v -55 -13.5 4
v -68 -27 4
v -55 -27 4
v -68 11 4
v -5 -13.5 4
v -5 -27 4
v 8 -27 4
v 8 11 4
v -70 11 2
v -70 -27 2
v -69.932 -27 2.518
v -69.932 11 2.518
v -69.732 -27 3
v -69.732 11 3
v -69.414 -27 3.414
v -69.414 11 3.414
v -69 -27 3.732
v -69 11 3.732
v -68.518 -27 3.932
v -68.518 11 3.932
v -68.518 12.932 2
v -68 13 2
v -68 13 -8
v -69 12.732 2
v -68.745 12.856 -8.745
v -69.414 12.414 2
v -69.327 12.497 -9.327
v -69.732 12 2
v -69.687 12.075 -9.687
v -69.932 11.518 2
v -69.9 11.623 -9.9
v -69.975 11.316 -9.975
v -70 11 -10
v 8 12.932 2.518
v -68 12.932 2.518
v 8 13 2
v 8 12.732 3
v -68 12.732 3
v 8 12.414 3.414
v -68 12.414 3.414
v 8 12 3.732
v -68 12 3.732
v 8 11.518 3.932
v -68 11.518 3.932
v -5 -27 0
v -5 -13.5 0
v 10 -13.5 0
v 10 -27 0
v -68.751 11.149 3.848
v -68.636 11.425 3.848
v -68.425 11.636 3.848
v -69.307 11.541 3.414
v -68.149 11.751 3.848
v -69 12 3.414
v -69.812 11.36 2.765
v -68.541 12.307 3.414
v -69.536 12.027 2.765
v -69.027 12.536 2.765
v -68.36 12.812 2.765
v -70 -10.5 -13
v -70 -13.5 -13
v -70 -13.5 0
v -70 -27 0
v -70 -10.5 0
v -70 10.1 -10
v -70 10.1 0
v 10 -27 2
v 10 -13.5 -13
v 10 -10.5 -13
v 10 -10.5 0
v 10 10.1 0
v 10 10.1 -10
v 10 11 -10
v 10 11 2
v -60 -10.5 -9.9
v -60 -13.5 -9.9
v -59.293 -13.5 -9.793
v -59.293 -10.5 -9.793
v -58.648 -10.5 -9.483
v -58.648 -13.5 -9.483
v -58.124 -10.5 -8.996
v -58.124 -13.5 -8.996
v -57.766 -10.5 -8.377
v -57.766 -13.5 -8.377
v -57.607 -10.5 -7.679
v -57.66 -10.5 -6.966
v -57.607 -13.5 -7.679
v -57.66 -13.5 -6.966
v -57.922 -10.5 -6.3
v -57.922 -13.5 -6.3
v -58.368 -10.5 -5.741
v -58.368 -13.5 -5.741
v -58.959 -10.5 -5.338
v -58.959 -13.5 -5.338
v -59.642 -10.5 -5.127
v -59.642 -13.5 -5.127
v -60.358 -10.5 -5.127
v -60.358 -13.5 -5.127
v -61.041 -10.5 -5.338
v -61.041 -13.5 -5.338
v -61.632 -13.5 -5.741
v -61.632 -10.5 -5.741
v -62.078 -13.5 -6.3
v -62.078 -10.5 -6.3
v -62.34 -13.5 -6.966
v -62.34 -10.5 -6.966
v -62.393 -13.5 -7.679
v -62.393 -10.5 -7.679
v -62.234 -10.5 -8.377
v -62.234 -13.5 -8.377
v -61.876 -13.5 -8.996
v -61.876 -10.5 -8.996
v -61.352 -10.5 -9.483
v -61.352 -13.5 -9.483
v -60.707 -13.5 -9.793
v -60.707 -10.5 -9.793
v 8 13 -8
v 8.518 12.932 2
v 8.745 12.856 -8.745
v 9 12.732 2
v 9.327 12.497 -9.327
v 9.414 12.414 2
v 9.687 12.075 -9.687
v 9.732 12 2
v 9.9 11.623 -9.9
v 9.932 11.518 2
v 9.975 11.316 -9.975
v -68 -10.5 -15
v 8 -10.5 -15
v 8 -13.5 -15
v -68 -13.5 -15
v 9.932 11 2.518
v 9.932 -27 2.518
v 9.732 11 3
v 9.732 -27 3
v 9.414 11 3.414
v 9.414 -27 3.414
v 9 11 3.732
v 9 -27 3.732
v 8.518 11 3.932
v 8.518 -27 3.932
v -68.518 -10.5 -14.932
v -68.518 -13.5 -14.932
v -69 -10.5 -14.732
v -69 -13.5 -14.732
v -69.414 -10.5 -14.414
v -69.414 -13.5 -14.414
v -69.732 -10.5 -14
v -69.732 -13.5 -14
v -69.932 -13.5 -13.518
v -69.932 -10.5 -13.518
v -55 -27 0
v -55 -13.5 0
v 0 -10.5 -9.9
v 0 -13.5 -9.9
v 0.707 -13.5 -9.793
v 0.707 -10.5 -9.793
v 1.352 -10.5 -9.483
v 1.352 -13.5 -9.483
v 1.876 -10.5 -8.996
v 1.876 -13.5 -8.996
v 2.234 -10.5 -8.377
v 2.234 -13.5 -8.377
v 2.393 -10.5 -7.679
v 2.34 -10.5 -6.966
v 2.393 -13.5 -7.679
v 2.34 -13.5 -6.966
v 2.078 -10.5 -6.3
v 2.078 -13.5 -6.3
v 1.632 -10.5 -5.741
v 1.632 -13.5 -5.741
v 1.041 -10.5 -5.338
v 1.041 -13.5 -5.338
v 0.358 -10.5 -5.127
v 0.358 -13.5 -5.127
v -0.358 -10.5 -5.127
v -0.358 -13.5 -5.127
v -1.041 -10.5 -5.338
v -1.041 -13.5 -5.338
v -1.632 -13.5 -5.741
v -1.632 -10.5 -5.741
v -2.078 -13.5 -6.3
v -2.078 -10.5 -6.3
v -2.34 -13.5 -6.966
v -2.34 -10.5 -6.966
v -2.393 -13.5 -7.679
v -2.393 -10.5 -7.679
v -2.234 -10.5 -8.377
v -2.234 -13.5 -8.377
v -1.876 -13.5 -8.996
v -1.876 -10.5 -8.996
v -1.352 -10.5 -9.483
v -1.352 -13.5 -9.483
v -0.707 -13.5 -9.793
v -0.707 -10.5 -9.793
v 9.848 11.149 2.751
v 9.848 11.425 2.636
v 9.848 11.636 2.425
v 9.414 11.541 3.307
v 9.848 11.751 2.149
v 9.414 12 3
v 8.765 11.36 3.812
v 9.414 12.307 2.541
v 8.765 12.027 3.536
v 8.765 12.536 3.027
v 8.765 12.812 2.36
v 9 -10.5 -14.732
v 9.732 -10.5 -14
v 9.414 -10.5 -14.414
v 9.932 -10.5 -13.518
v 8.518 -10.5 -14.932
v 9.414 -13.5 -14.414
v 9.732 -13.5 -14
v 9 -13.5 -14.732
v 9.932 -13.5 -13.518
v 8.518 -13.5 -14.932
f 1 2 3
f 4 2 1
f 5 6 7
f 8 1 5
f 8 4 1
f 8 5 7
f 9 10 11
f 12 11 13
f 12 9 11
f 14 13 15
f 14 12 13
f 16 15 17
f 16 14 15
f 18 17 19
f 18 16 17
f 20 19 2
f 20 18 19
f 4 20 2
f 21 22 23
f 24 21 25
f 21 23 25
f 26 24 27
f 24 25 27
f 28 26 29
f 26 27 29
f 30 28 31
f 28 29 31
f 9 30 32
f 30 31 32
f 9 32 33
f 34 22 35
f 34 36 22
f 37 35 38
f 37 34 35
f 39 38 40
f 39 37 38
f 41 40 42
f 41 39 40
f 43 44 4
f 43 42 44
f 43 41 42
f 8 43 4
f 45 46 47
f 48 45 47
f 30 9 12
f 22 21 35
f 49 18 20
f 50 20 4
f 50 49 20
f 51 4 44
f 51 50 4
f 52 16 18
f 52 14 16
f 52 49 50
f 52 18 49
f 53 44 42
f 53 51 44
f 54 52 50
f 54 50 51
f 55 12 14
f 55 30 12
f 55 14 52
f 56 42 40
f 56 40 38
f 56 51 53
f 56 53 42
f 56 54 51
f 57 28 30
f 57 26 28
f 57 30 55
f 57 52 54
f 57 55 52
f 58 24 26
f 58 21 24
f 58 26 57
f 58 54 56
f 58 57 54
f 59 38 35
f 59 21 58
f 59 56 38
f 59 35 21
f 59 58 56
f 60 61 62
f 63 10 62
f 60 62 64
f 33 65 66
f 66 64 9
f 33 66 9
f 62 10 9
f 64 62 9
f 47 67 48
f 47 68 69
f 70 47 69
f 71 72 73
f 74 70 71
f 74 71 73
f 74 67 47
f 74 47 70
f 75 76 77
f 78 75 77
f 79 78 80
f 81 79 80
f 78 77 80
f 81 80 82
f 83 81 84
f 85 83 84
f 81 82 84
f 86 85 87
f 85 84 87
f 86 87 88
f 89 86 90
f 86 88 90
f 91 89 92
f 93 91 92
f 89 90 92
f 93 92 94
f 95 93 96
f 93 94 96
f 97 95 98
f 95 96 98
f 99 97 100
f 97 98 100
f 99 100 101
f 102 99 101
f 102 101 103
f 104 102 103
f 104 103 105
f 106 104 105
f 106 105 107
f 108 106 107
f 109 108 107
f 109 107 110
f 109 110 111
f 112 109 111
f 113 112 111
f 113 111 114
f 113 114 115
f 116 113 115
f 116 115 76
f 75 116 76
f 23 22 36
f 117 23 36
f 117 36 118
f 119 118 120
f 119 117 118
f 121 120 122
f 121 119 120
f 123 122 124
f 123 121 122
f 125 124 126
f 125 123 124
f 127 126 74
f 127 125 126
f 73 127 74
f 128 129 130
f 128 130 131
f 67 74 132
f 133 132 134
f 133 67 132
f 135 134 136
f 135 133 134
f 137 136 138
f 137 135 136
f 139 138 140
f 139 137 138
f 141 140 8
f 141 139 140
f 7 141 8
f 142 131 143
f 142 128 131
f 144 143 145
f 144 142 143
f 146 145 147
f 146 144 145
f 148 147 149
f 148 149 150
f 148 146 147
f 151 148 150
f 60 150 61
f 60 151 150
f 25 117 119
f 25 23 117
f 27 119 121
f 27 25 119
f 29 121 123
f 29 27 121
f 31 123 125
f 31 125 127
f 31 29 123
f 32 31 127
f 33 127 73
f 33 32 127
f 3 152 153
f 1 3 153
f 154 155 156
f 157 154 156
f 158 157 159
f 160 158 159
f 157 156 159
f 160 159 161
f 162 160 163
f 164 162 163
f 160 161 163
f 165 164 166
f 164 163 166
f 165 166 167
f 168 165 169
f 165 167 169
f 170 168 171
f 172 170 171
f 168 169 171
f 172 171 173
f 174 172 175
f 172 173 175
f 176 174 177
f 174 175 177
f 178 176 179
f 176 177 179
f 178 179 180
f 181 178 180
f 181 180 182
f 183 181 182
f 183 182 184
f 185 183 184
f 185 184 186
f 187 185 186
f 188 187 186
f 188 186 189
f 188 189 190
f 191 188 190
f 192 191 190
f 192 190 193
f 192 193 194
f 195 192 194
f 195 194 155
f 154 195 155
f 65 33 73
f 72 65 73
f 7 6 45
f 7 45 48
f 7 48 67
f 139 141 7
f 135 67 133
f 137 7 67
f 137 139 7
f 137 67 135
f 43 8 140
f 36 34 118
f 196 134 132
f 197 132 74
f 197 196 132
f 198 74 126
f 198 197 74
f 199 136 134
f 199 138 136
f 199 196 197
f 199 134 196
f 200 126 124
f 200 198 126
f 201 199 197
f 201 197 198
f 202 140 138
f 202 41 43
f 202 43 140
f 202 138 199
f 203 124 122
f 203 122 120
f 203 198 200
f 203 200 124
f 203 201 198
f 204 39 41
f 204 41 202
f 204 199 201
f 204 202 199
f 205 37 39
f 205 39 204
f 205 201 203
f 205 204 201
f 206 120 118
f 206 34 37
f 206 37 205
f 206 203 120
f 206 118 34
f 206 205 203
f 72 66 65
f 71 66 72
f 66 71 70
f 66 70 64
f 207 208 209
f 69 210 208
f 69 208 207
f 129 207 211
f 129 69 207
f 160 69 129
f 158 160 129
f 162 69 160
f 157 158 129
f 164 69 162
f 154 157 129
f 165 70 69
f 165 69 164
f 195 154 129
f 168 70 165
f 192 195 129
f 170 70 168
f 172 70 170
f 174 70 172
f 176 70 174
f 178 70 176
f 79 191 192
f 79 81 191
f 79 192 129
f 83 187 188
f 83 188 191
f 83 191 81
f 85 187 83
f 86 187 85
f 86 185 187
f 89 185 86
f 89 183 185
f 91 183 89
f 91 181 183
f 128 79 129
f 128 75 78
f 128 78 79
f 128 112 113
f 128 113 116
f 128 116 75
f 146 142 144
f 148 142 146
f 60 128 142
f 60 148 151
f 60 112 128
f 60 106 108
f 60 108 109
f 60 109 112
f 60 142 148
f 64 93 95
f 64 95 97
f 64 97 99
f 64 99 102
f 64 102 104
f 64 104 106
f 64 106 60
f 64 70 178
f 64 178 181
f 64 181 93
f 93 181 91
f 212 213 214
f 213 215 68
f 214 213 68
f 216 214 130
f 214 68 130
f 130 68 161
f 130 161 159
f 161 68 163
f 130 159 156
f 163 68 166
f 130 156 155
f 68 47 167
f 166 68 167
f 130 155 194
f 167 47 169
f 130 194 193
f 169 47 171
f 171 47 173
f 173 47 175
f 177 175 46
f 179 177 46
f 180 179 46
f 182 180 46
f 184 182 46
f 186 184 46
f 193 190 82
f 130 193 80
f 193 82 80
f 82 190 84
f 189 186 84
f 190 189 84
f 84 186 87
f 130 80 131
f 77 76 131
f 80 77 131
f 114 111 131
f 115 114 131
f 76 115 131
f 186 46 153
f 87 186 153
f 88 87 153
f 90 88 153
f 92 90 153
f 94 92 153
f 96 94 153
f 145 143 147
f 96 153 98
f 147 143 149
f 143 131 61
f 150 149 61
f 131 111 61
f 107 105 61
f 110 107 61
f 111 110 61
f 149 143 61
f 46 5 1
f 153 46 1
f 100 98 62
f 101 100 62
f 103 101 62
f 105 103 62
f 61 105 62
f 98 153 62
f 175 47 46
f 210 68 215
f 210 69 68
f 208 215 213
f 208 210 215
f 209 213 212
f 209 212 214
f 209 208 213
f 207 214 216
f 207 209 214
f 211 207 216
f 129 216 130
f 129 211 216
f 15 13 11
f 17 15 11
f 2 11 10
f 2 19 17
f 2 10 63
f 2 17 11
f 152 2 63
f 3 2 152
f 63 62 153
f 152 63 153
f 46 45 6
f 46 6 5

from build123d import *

# Parameters (mm, degrees)
SKETCH_1_R              = 1.7
SKETCH_1_R_2            = 11.5
EXTRUDE_1_DEPTH         = 4
SKETCH_1_4_W            = 80
SKETCH_1_4_H            = 3
EXTRUDE_2_DEPTH         = 10
EXTRUDE_3_DEPTH         = 10
RIB_2_REACH             = 110.093
SKETCH_4_WALL_W         = 240.545785644
SKETCH_4_WALL_H         = 5
SKETCH_5_W              = 2
SKETCH_5_H              = 0.1
SKETCH_5_W_2            = 4.2
SKETCH_5_H_2            = 2
CUT_EXTRUDE_2_DEPTH     = 10
CHAMFER_1_SIZE          = 0.25
SKETCH_6_W              = 91
SKETCH_6_H              = 17
EXTRUDE_4_DEPTH         = 4
SKETCH_7_W              = 80
SKETCH_7_H              = 3.5
EXTRUDE_5_DEPTH         = 15
SKETCH_8_W              = 50
SKETCH_8_H              = 13.5
CUT_EXTRUDE_3_DEPTH     = 102.533245787
CUT_EXTRUDE_4_DEPTH     = 15
CUT_EXTRUDE_5_REACH     = 113.513
SKETCH_10_R             = 2.4
FILLET_1_R              = 10
SKETCH_11_W             = 92.157342817
SKETCH_11_H             = 59.862511732
CUT_EXTRUDE_6_DEPTH     = 103.200782776
CUT_EXTRUDE_START       = -15
CUT_EXTRUDE_7_OUTLINE_W = 80
CUT_EXTRUDE_7_OUTLINE_H = 0.5
CUT_EXTRUDE_7_DEPTH     = 15
FILLET_2_R              = 2


# Read off the part's stored shape, not the designer's step: 切除-拉伸7
with BuildPart() as part:
    # 草图1 → 凸台-拉伸1 (new body)
    with BuildSketch(Plane.XY):
        with BuildLine():
            Line((-70, 13), (-70, -10))
            Line((-70, -10), (21, -10))
            Line((21, -10), (21, 44.755002002))
            ThreePointArc((21, 44.755002002), (20.506939094, 46.920065511), (19.125, 48.658125751))
            ThreePointArc((19.125, 48.658125751), (18, 51), (19.125, 53.341874249))
            ThreePointArc((19.125, 53.341874249), (20.506939094, 55.079934489), (21, 57.244997998))
            Line((21, 57.244997998), (21, 67))
            ThreePointArc((21, 67), (19.535533906, 70.535533906), (16, 72))
            Line((16, 72), (6.244997998, 72))
            ThreePointArc((6.244997998, 72), (4.079934489, 71.506939094), (2.341874249, 70.125))
            ThreePointArc((2.341874249, 70.125), (0, 69), (-2.341874249, 70.125))
            ThreePointArc((-2.341874249, 70.125), (-4.079934489, 71.506939094), (-6.244997998, 72))
            Line((-6.244997998, 72), (-16, 72))
            ThreePointArc((-16, 72), (-19.535533906, 70.535533906), (-21, 67))
            Line((-21, 67), (-21, 57.244997998))
            ThreePointArc((-21, 57.244997998), (-20.506939094, 55.079934489), (-19.125, 53.341874249))
            ThreePointArc((-19.125, 53.341874249), (-18, 51), (-19.125, 48.658125751))
            ThreePointArc((-19.125, 48.658125751), (-20.506939094, 46.920065511), (-21, 44.755002002))
            Line((-21, 44.755002002), (-21, 13))
            Line((-21, 13), (-70, 13))
        make_face()
        with Locations((-15.5, 35.5)):
            Circle(SKETCH_1_R, mode=Mode.SUBTRACT)
        with Locations((-15.5, 66.5)):
            Circle(SKETCH_1_R, mode=Mode.SUBTRACT)
        with Locations((15.5, 35.5)):
            Circle(SKETCH_1_R, mode=Mode.SUBTRACT)
        with Locations((0, 51)):
            Circle(SKETCH_1_R_2, mode=Mode.SUBTRACT)
        with Locations((15.5, 66.5)):
            Circle(SKETCH_1_R, mode=Mode.SUBTRACT)
    extrude(amount=EXTRUDE_1_DEPTH)

    # 草图1<4> → 凸台-拉伸2 (add)
    with BuildSketch(Plane.XY):
        with Locations((-30, 11.5)):
            Rectangle(SKETCH_1_4_W, SKETCH_1_4_H)
    extrude(amount=-EXTRUDE_2_DEPTH)

    # 草图1<5> → 凸台-拉伸3 (add)
    with BuildSketch(Plane.XY):
        Polygon((3.05, 8), (3.05, 10), (-3.05, 10), (-3.05, 8), (-5.05, 8), (-5.05, 6.5), (-4.55, 6), (4.55, 6), (5.05, 6.5), (5.05, 8), align=None)
        Polygon((-16.95, 10), (-23.05, 10), (-23.05, 8), (-25.05, 8), (-25.05, 6.5), (-24.55, 6), (-15.45, 6), (-14.95, 6.5), (-14.95, 8), (-16.95, 8), align=None)
        Polygon((-36.95, 10), (-43.05, 10), (-43.05, 8), (-45.05, 8), (-45.05, 6.5), (-44.55, 6), (-35.45, 6), (-34.95, 6.5), (-34.95, 8), (-36.95, 8), align=None)
        Polygon((-26, 4.55), (-26, -4.55), (-26.5, -5.05), (-28, -5.05), (-28, -3.05), (-32, -3.05), (-32, -5.05), (-33.5, -5.05), (-34, -4.55), (-34, 4.55), (-33.5, 5.05), (-32, 5.05), (-32, 3.05), (-28, 3.05), (-28, 5.05), (-26.5, 5.05), align=None)
        Polygon((-23.05, -8), (-23.05, -10), (-16.95, -10), (-16.95, -8), (-14.95, -8), (-14.95, -6.5), (-15.45, -6), (-24.55, -6), (-25.05, -6.5), (-25.05, -8), align=None)
        Polygon((-43.05, -8), (-43.05, -10), (-36.95, -10), (-36.95, -8), (-34.95, -8), (-34.95, -6.5), (-35.45, -6), (-44.55, -6), (-45.05, -6.5), (-45.05, -8), align=None)
    extrude(amount=-EXTRUDE_3_DEPTH)

    # 草图4 wall → 筋2 (add, up to next)
    with BuildSketch(Plane(origin=(10, 23, -5), x_dir=(0, 0.894427191, 0.4472135955), z_dir=(0, -0.4472135955, 0.894427191)), mode=Mode.PRIVATE) as rib_2_sk1:
        with Locations((0, 2.5)):
            Rectangle(SKETCH_4_WALL_W, SKETCH_4_WALL_H)
    rib_2_tool1 = extrude(rib_2_sk1.sketch, amount=RIB_2_REACH, mode=Mode.PRIVATE) - part.part
    rib_2 = rib_2_tool1.solids().sort_by_distance((10, 23, -5))[0]
    add(rib_2)

    # 镜向1: 筋2 across plane
    add(rib_2.mirror(Plane(origin=(0, 0, 0), x_dir=(0, 0, 1), z_dir=(1, 0, 0))))

    # 草图5 → 切除-拉伸2 (cut)
    with BuildSketch(Plane(origin=(0, 0, -10), x_dir=(-1, 0, 0), z_dir=(0, 0, -1))):
        with Locations((15.95, 7.95)):
            Rectangle(SKETCH_5_W, SKETCH_5_H)
        with Locations((24.05, 7.95)):
            Rectangle(SKETCH_5_W, SKETCH_5_H)
        with Locations((35.95, 7.95)):
            Rectangle(SKETCH_5_W, SKETCH_5_H)
        with Locations((44.05, 7.95)):
            Rectangle(SKETCH_5_W, SKETCH_5_H)
        with Locations((30, 4.05)):
            Rectangle(SKETCH_5_W_2, SKETCH_5_H_2)
        with Locations((30, -4.05)):
            Rectangle(SKETCH_5_W_2, SKETCH_5_H_2)
        with Locations((44.05, -7.95)):
            Rectangle(SKETCH_5_W, SKETCH_5_H)
        with Locations((35.95, -7.95)):
            Rectangle(SKETCH_5_W, SKETCH_5_H)
        with Locations((24.05, -7.95)):
            Rectangle(SKETCH_5_W, SKETCH_5_H)
        with Locations((15.95, -7.95)):
            Rectangle(SKETCH_5_W, SKETCH_5_H)
    extrude(amount=-CUT_EXTRUDE_2_DEPTH, mode=Mode.SUBTRACT)

    # 倒角1
    chamfer_1_edges = [part.edges().sort_by_distance(p)[0] for p in [
        (3.05, 8, -5),
        (5.05, 8, -5),
        (-5.05, 8, -5),
        (-3.05, 8, -5),
        (-16.95, 7.9, -5),
        (-14.95, 7.9, -5),
        (-23.05, 7.9, -5),
        (-25.05, 7.9, -5),
        (-36.95, 7.9, -5),
        (-34.95, 7.9, -5),
        (-43.05, 7.9, -5),
        (-45.05, 7.9, -5),
        (-27.9, 5.05, -5),
        (-32.1, 3.05, -5),
        (-32.1, 5.05, -5),
        (-27.9, 3.05, -5),
        (-32.1, -5.05, -5),
        (-32.1, -3.05, -5),
        (-27.9, -3.05, -5),
        (-27.9, -5.05, -5),
        (-43.05, -7.9, -5),
        (-45.05, -7.9, -5),
        (-36.95, -7.9, -5),
        (-34.95, -7.9, -5),
        (-23.05, -7.9, -5),
        (-25.05, -7.9, -5),
        (-16.95, -7.9, -5),
        (-14.95, -7.9, -5),
    ]]
    chamfer(chamfer_1_edges, length=CHAMFER_1_SIZE)

    # 草图6 → 凸台-拉伸4 (add)
    with BuildSketch(Plane.XY.offset(4)):
        with Locations((-24.5, -18.5)):
            Rectangle(SKETCH_6_W, SKETCH_6_H)
    extrude(amount=-EXTRUDE_4_DEPTH)

    # 草图7 → 凸台-拉伸5 (add)
    with BuildSketch(Plane(origin=(0, 0, 0), x_dir=(-1, 0, 0), z_dir=(0, 0, -1))):
        with Locations((30, -11.75)):
            Rectangle(SKETCH_7_W, SKETCH_7_H)
    extrude(amount=EXTRUDE_5_DEPTH)

    # 草图8 → 切除-拉伸3 (cut, through all)
    with BuildSketch(Plane(origin=(0, 0, 0), x_dir=(-1, 0, 0), z_dir=(0, 0, -1))):
        with Locations((30, -20.25)):
            Rectangle(SKETCH_8_W, SKETCH_8_H)
        with BuildLine():
            Line((-21, -27), (-10, -27))
            Line((-10, -27), (-10, 26))
            ThreePointArc((-10, 26), (-11.171572875, 28.828427125), (-14, 30))
            Line((-14, 30), (-16, 30))
            ThreePointArc((-16, 30), (-19.535533906, 31.464466094), (-21, 35))
            Line((-21, 35), (-21, 30))
            Line((-21, 30), (-21, -27))
        make_face()
    extrude(amount=-CUT_EXTRUDE_3_DEPTH, mode=Mode.SUBTRACT)

    # 草图9 → 切除-拉伸4 (cut)
    with BuildSketch(Plane(origin=(0, 0, -15), x_dir=(-1, 0, 0), z_dir=(0, 0, -1))):
        Polygon((50, -10), (25.452851286, -10), (11.122555598, -10), (11.122555598, 0.364824121), (25.452851286, 0.364824121), (25.452851286, 5.586221175), (50, 5.586221175), align=None)
    extrude(amount=-CUT_EXTRUDE_4_DEPTH, mode=Mode.SUBTRACT)

    # 草图10 → 切除-拉伸5 (cut, up to next)
    with BuildSketch(Plane.XZ.offset(13.5), mode=Mode.PRIVATE) as cut_extrude_5_sk1:
        with Locations(Location((0, -7.5, 0), (0, 0, 270))):
            Circle(SKETCH_10_R)
    cut_extrude_5_tool1 = extrude(cut_extrude_5_sk1.sketch, amount=-CUT_EXTRUDE_5_REACH, mode=Mode.PRIVATE) & part.part
    # 草图10 → 切除-拉伸5 (cut, up to next)
    with BuildSketch(Plane.XZ.offset(13.5), mode=Mode.PRIVATE) as cut_extrude_5_sk2:
        with Locations(Location((-60, -7.5, 0), (0, 0, 270))):
            Circle(SKETCH_10_R)
    cut_extrude_5_tool2 = extrude(cut_extrude_5_sk2.sketch, amount=-CUT_EXTRUDE_5_REACH, mode=Mode.PRIVATE) & part.part
    add(cut_extrude_5_tool1.solids().sort_by_distance((0, -13.5, -7.5))[0], mode=Mode.SUBTRACT)
    add(cut_extrude_5_tool2.solids().sort_by_distance((-60, -13.5, -7.5))[0], mode=Mode.SUBTRACT)

    # 圆角1
    fillet_1_edges = [part.edges().sort_by_distance(p)[0] for p in [
        (-21, 13, 2),
    ]]
    fillet(fillet_1_edges, radius=FILLET_1_R)

    # 草图11 → 切除-拉伸6 (cut, through all)
    with BuildSketch(Plane(origin=(0, 0, -15), x_dir=(-1, 0, 0), z_dir=(0, 0, -1))):
        with Locations((23.921328592, 42.931255866)):
            Rectangle(SKETCH_11_W, SKETCH_11_H)
    extrude(amount=-CUT_EXTRUDE_6_DEPTH, mode=Mode.SUBTRACT)

    # 切除-拉伸7 outline → 切除-拉伸7 (cut)
    with BuildSketch(Plane(origin=(0, 0, -15), x_dir=(-1, 0, 0), z_dir=(0, 0, -1)).offset(CUT_EXTRUDE_START)):
        with Locations((30, -10.25)):
            Rectangle(CUT_EXTRUDE_7_OUTLINE_W, CUT_EXTRUDE_7_OUTLINE_H)
        Polygon((-10, 10.1), (-10, 10), (-3.05, 10), (-3.05, 8.25), (-3.3, 8), (-4.8, 8), (-5.05, 7.75), (-5.05, 6.5), (-4.55, 6), (4.55, 6), (5.05, 6.5), (5.05, 7.75), (4.8, 8), (3.3, 8), (3.05, 8.25), (3.05, 10), (16.95, 10), (16.95, 8.15), (16.7, 7.9), (15.2, 7.9), (14.95, 7.65), (14.95, 6.5), (15.45, 6), (24.55, 6), (25.05, 6.5), (25.05, 7.65), (24.8, 7.9), (23.3, 7.9), (23.05, 8.15), (23.05, 10), (36.95, 10), (36.95, 8.15), (36.7, 7.9), (35.2, 7.9), (34.95, 7.65), (34.95, 6.5), (35.45, 6), (44.55, 6), (45.05, 6.5), (45.05, 7.65), (44.8, 7.9), (43.3, 7.9), (43.05, 8.15), (43.05, 10), (70, 10), (70, 10.1), align=None)
    extrude(amount=CUT_EXTRUDE_7_DEPTH, mode=Mode.SUBTRACT)

    # 圆角2
    fillet_2_edges = [part.edges().sort_by_distance(p)[0] for p in [
        (-70, 13, -3),
        (-70, -12, -15),
        (-30, 13, -10),
        (-70, -7, 4),
        (-30, 13, 4),
        (10, -7, 4),
        (10, 13, -3),
        (10, -12, -15),
    ]]
    fillet(fillet_2_edges, radius=FILLET_2_R)


solid = part.part
